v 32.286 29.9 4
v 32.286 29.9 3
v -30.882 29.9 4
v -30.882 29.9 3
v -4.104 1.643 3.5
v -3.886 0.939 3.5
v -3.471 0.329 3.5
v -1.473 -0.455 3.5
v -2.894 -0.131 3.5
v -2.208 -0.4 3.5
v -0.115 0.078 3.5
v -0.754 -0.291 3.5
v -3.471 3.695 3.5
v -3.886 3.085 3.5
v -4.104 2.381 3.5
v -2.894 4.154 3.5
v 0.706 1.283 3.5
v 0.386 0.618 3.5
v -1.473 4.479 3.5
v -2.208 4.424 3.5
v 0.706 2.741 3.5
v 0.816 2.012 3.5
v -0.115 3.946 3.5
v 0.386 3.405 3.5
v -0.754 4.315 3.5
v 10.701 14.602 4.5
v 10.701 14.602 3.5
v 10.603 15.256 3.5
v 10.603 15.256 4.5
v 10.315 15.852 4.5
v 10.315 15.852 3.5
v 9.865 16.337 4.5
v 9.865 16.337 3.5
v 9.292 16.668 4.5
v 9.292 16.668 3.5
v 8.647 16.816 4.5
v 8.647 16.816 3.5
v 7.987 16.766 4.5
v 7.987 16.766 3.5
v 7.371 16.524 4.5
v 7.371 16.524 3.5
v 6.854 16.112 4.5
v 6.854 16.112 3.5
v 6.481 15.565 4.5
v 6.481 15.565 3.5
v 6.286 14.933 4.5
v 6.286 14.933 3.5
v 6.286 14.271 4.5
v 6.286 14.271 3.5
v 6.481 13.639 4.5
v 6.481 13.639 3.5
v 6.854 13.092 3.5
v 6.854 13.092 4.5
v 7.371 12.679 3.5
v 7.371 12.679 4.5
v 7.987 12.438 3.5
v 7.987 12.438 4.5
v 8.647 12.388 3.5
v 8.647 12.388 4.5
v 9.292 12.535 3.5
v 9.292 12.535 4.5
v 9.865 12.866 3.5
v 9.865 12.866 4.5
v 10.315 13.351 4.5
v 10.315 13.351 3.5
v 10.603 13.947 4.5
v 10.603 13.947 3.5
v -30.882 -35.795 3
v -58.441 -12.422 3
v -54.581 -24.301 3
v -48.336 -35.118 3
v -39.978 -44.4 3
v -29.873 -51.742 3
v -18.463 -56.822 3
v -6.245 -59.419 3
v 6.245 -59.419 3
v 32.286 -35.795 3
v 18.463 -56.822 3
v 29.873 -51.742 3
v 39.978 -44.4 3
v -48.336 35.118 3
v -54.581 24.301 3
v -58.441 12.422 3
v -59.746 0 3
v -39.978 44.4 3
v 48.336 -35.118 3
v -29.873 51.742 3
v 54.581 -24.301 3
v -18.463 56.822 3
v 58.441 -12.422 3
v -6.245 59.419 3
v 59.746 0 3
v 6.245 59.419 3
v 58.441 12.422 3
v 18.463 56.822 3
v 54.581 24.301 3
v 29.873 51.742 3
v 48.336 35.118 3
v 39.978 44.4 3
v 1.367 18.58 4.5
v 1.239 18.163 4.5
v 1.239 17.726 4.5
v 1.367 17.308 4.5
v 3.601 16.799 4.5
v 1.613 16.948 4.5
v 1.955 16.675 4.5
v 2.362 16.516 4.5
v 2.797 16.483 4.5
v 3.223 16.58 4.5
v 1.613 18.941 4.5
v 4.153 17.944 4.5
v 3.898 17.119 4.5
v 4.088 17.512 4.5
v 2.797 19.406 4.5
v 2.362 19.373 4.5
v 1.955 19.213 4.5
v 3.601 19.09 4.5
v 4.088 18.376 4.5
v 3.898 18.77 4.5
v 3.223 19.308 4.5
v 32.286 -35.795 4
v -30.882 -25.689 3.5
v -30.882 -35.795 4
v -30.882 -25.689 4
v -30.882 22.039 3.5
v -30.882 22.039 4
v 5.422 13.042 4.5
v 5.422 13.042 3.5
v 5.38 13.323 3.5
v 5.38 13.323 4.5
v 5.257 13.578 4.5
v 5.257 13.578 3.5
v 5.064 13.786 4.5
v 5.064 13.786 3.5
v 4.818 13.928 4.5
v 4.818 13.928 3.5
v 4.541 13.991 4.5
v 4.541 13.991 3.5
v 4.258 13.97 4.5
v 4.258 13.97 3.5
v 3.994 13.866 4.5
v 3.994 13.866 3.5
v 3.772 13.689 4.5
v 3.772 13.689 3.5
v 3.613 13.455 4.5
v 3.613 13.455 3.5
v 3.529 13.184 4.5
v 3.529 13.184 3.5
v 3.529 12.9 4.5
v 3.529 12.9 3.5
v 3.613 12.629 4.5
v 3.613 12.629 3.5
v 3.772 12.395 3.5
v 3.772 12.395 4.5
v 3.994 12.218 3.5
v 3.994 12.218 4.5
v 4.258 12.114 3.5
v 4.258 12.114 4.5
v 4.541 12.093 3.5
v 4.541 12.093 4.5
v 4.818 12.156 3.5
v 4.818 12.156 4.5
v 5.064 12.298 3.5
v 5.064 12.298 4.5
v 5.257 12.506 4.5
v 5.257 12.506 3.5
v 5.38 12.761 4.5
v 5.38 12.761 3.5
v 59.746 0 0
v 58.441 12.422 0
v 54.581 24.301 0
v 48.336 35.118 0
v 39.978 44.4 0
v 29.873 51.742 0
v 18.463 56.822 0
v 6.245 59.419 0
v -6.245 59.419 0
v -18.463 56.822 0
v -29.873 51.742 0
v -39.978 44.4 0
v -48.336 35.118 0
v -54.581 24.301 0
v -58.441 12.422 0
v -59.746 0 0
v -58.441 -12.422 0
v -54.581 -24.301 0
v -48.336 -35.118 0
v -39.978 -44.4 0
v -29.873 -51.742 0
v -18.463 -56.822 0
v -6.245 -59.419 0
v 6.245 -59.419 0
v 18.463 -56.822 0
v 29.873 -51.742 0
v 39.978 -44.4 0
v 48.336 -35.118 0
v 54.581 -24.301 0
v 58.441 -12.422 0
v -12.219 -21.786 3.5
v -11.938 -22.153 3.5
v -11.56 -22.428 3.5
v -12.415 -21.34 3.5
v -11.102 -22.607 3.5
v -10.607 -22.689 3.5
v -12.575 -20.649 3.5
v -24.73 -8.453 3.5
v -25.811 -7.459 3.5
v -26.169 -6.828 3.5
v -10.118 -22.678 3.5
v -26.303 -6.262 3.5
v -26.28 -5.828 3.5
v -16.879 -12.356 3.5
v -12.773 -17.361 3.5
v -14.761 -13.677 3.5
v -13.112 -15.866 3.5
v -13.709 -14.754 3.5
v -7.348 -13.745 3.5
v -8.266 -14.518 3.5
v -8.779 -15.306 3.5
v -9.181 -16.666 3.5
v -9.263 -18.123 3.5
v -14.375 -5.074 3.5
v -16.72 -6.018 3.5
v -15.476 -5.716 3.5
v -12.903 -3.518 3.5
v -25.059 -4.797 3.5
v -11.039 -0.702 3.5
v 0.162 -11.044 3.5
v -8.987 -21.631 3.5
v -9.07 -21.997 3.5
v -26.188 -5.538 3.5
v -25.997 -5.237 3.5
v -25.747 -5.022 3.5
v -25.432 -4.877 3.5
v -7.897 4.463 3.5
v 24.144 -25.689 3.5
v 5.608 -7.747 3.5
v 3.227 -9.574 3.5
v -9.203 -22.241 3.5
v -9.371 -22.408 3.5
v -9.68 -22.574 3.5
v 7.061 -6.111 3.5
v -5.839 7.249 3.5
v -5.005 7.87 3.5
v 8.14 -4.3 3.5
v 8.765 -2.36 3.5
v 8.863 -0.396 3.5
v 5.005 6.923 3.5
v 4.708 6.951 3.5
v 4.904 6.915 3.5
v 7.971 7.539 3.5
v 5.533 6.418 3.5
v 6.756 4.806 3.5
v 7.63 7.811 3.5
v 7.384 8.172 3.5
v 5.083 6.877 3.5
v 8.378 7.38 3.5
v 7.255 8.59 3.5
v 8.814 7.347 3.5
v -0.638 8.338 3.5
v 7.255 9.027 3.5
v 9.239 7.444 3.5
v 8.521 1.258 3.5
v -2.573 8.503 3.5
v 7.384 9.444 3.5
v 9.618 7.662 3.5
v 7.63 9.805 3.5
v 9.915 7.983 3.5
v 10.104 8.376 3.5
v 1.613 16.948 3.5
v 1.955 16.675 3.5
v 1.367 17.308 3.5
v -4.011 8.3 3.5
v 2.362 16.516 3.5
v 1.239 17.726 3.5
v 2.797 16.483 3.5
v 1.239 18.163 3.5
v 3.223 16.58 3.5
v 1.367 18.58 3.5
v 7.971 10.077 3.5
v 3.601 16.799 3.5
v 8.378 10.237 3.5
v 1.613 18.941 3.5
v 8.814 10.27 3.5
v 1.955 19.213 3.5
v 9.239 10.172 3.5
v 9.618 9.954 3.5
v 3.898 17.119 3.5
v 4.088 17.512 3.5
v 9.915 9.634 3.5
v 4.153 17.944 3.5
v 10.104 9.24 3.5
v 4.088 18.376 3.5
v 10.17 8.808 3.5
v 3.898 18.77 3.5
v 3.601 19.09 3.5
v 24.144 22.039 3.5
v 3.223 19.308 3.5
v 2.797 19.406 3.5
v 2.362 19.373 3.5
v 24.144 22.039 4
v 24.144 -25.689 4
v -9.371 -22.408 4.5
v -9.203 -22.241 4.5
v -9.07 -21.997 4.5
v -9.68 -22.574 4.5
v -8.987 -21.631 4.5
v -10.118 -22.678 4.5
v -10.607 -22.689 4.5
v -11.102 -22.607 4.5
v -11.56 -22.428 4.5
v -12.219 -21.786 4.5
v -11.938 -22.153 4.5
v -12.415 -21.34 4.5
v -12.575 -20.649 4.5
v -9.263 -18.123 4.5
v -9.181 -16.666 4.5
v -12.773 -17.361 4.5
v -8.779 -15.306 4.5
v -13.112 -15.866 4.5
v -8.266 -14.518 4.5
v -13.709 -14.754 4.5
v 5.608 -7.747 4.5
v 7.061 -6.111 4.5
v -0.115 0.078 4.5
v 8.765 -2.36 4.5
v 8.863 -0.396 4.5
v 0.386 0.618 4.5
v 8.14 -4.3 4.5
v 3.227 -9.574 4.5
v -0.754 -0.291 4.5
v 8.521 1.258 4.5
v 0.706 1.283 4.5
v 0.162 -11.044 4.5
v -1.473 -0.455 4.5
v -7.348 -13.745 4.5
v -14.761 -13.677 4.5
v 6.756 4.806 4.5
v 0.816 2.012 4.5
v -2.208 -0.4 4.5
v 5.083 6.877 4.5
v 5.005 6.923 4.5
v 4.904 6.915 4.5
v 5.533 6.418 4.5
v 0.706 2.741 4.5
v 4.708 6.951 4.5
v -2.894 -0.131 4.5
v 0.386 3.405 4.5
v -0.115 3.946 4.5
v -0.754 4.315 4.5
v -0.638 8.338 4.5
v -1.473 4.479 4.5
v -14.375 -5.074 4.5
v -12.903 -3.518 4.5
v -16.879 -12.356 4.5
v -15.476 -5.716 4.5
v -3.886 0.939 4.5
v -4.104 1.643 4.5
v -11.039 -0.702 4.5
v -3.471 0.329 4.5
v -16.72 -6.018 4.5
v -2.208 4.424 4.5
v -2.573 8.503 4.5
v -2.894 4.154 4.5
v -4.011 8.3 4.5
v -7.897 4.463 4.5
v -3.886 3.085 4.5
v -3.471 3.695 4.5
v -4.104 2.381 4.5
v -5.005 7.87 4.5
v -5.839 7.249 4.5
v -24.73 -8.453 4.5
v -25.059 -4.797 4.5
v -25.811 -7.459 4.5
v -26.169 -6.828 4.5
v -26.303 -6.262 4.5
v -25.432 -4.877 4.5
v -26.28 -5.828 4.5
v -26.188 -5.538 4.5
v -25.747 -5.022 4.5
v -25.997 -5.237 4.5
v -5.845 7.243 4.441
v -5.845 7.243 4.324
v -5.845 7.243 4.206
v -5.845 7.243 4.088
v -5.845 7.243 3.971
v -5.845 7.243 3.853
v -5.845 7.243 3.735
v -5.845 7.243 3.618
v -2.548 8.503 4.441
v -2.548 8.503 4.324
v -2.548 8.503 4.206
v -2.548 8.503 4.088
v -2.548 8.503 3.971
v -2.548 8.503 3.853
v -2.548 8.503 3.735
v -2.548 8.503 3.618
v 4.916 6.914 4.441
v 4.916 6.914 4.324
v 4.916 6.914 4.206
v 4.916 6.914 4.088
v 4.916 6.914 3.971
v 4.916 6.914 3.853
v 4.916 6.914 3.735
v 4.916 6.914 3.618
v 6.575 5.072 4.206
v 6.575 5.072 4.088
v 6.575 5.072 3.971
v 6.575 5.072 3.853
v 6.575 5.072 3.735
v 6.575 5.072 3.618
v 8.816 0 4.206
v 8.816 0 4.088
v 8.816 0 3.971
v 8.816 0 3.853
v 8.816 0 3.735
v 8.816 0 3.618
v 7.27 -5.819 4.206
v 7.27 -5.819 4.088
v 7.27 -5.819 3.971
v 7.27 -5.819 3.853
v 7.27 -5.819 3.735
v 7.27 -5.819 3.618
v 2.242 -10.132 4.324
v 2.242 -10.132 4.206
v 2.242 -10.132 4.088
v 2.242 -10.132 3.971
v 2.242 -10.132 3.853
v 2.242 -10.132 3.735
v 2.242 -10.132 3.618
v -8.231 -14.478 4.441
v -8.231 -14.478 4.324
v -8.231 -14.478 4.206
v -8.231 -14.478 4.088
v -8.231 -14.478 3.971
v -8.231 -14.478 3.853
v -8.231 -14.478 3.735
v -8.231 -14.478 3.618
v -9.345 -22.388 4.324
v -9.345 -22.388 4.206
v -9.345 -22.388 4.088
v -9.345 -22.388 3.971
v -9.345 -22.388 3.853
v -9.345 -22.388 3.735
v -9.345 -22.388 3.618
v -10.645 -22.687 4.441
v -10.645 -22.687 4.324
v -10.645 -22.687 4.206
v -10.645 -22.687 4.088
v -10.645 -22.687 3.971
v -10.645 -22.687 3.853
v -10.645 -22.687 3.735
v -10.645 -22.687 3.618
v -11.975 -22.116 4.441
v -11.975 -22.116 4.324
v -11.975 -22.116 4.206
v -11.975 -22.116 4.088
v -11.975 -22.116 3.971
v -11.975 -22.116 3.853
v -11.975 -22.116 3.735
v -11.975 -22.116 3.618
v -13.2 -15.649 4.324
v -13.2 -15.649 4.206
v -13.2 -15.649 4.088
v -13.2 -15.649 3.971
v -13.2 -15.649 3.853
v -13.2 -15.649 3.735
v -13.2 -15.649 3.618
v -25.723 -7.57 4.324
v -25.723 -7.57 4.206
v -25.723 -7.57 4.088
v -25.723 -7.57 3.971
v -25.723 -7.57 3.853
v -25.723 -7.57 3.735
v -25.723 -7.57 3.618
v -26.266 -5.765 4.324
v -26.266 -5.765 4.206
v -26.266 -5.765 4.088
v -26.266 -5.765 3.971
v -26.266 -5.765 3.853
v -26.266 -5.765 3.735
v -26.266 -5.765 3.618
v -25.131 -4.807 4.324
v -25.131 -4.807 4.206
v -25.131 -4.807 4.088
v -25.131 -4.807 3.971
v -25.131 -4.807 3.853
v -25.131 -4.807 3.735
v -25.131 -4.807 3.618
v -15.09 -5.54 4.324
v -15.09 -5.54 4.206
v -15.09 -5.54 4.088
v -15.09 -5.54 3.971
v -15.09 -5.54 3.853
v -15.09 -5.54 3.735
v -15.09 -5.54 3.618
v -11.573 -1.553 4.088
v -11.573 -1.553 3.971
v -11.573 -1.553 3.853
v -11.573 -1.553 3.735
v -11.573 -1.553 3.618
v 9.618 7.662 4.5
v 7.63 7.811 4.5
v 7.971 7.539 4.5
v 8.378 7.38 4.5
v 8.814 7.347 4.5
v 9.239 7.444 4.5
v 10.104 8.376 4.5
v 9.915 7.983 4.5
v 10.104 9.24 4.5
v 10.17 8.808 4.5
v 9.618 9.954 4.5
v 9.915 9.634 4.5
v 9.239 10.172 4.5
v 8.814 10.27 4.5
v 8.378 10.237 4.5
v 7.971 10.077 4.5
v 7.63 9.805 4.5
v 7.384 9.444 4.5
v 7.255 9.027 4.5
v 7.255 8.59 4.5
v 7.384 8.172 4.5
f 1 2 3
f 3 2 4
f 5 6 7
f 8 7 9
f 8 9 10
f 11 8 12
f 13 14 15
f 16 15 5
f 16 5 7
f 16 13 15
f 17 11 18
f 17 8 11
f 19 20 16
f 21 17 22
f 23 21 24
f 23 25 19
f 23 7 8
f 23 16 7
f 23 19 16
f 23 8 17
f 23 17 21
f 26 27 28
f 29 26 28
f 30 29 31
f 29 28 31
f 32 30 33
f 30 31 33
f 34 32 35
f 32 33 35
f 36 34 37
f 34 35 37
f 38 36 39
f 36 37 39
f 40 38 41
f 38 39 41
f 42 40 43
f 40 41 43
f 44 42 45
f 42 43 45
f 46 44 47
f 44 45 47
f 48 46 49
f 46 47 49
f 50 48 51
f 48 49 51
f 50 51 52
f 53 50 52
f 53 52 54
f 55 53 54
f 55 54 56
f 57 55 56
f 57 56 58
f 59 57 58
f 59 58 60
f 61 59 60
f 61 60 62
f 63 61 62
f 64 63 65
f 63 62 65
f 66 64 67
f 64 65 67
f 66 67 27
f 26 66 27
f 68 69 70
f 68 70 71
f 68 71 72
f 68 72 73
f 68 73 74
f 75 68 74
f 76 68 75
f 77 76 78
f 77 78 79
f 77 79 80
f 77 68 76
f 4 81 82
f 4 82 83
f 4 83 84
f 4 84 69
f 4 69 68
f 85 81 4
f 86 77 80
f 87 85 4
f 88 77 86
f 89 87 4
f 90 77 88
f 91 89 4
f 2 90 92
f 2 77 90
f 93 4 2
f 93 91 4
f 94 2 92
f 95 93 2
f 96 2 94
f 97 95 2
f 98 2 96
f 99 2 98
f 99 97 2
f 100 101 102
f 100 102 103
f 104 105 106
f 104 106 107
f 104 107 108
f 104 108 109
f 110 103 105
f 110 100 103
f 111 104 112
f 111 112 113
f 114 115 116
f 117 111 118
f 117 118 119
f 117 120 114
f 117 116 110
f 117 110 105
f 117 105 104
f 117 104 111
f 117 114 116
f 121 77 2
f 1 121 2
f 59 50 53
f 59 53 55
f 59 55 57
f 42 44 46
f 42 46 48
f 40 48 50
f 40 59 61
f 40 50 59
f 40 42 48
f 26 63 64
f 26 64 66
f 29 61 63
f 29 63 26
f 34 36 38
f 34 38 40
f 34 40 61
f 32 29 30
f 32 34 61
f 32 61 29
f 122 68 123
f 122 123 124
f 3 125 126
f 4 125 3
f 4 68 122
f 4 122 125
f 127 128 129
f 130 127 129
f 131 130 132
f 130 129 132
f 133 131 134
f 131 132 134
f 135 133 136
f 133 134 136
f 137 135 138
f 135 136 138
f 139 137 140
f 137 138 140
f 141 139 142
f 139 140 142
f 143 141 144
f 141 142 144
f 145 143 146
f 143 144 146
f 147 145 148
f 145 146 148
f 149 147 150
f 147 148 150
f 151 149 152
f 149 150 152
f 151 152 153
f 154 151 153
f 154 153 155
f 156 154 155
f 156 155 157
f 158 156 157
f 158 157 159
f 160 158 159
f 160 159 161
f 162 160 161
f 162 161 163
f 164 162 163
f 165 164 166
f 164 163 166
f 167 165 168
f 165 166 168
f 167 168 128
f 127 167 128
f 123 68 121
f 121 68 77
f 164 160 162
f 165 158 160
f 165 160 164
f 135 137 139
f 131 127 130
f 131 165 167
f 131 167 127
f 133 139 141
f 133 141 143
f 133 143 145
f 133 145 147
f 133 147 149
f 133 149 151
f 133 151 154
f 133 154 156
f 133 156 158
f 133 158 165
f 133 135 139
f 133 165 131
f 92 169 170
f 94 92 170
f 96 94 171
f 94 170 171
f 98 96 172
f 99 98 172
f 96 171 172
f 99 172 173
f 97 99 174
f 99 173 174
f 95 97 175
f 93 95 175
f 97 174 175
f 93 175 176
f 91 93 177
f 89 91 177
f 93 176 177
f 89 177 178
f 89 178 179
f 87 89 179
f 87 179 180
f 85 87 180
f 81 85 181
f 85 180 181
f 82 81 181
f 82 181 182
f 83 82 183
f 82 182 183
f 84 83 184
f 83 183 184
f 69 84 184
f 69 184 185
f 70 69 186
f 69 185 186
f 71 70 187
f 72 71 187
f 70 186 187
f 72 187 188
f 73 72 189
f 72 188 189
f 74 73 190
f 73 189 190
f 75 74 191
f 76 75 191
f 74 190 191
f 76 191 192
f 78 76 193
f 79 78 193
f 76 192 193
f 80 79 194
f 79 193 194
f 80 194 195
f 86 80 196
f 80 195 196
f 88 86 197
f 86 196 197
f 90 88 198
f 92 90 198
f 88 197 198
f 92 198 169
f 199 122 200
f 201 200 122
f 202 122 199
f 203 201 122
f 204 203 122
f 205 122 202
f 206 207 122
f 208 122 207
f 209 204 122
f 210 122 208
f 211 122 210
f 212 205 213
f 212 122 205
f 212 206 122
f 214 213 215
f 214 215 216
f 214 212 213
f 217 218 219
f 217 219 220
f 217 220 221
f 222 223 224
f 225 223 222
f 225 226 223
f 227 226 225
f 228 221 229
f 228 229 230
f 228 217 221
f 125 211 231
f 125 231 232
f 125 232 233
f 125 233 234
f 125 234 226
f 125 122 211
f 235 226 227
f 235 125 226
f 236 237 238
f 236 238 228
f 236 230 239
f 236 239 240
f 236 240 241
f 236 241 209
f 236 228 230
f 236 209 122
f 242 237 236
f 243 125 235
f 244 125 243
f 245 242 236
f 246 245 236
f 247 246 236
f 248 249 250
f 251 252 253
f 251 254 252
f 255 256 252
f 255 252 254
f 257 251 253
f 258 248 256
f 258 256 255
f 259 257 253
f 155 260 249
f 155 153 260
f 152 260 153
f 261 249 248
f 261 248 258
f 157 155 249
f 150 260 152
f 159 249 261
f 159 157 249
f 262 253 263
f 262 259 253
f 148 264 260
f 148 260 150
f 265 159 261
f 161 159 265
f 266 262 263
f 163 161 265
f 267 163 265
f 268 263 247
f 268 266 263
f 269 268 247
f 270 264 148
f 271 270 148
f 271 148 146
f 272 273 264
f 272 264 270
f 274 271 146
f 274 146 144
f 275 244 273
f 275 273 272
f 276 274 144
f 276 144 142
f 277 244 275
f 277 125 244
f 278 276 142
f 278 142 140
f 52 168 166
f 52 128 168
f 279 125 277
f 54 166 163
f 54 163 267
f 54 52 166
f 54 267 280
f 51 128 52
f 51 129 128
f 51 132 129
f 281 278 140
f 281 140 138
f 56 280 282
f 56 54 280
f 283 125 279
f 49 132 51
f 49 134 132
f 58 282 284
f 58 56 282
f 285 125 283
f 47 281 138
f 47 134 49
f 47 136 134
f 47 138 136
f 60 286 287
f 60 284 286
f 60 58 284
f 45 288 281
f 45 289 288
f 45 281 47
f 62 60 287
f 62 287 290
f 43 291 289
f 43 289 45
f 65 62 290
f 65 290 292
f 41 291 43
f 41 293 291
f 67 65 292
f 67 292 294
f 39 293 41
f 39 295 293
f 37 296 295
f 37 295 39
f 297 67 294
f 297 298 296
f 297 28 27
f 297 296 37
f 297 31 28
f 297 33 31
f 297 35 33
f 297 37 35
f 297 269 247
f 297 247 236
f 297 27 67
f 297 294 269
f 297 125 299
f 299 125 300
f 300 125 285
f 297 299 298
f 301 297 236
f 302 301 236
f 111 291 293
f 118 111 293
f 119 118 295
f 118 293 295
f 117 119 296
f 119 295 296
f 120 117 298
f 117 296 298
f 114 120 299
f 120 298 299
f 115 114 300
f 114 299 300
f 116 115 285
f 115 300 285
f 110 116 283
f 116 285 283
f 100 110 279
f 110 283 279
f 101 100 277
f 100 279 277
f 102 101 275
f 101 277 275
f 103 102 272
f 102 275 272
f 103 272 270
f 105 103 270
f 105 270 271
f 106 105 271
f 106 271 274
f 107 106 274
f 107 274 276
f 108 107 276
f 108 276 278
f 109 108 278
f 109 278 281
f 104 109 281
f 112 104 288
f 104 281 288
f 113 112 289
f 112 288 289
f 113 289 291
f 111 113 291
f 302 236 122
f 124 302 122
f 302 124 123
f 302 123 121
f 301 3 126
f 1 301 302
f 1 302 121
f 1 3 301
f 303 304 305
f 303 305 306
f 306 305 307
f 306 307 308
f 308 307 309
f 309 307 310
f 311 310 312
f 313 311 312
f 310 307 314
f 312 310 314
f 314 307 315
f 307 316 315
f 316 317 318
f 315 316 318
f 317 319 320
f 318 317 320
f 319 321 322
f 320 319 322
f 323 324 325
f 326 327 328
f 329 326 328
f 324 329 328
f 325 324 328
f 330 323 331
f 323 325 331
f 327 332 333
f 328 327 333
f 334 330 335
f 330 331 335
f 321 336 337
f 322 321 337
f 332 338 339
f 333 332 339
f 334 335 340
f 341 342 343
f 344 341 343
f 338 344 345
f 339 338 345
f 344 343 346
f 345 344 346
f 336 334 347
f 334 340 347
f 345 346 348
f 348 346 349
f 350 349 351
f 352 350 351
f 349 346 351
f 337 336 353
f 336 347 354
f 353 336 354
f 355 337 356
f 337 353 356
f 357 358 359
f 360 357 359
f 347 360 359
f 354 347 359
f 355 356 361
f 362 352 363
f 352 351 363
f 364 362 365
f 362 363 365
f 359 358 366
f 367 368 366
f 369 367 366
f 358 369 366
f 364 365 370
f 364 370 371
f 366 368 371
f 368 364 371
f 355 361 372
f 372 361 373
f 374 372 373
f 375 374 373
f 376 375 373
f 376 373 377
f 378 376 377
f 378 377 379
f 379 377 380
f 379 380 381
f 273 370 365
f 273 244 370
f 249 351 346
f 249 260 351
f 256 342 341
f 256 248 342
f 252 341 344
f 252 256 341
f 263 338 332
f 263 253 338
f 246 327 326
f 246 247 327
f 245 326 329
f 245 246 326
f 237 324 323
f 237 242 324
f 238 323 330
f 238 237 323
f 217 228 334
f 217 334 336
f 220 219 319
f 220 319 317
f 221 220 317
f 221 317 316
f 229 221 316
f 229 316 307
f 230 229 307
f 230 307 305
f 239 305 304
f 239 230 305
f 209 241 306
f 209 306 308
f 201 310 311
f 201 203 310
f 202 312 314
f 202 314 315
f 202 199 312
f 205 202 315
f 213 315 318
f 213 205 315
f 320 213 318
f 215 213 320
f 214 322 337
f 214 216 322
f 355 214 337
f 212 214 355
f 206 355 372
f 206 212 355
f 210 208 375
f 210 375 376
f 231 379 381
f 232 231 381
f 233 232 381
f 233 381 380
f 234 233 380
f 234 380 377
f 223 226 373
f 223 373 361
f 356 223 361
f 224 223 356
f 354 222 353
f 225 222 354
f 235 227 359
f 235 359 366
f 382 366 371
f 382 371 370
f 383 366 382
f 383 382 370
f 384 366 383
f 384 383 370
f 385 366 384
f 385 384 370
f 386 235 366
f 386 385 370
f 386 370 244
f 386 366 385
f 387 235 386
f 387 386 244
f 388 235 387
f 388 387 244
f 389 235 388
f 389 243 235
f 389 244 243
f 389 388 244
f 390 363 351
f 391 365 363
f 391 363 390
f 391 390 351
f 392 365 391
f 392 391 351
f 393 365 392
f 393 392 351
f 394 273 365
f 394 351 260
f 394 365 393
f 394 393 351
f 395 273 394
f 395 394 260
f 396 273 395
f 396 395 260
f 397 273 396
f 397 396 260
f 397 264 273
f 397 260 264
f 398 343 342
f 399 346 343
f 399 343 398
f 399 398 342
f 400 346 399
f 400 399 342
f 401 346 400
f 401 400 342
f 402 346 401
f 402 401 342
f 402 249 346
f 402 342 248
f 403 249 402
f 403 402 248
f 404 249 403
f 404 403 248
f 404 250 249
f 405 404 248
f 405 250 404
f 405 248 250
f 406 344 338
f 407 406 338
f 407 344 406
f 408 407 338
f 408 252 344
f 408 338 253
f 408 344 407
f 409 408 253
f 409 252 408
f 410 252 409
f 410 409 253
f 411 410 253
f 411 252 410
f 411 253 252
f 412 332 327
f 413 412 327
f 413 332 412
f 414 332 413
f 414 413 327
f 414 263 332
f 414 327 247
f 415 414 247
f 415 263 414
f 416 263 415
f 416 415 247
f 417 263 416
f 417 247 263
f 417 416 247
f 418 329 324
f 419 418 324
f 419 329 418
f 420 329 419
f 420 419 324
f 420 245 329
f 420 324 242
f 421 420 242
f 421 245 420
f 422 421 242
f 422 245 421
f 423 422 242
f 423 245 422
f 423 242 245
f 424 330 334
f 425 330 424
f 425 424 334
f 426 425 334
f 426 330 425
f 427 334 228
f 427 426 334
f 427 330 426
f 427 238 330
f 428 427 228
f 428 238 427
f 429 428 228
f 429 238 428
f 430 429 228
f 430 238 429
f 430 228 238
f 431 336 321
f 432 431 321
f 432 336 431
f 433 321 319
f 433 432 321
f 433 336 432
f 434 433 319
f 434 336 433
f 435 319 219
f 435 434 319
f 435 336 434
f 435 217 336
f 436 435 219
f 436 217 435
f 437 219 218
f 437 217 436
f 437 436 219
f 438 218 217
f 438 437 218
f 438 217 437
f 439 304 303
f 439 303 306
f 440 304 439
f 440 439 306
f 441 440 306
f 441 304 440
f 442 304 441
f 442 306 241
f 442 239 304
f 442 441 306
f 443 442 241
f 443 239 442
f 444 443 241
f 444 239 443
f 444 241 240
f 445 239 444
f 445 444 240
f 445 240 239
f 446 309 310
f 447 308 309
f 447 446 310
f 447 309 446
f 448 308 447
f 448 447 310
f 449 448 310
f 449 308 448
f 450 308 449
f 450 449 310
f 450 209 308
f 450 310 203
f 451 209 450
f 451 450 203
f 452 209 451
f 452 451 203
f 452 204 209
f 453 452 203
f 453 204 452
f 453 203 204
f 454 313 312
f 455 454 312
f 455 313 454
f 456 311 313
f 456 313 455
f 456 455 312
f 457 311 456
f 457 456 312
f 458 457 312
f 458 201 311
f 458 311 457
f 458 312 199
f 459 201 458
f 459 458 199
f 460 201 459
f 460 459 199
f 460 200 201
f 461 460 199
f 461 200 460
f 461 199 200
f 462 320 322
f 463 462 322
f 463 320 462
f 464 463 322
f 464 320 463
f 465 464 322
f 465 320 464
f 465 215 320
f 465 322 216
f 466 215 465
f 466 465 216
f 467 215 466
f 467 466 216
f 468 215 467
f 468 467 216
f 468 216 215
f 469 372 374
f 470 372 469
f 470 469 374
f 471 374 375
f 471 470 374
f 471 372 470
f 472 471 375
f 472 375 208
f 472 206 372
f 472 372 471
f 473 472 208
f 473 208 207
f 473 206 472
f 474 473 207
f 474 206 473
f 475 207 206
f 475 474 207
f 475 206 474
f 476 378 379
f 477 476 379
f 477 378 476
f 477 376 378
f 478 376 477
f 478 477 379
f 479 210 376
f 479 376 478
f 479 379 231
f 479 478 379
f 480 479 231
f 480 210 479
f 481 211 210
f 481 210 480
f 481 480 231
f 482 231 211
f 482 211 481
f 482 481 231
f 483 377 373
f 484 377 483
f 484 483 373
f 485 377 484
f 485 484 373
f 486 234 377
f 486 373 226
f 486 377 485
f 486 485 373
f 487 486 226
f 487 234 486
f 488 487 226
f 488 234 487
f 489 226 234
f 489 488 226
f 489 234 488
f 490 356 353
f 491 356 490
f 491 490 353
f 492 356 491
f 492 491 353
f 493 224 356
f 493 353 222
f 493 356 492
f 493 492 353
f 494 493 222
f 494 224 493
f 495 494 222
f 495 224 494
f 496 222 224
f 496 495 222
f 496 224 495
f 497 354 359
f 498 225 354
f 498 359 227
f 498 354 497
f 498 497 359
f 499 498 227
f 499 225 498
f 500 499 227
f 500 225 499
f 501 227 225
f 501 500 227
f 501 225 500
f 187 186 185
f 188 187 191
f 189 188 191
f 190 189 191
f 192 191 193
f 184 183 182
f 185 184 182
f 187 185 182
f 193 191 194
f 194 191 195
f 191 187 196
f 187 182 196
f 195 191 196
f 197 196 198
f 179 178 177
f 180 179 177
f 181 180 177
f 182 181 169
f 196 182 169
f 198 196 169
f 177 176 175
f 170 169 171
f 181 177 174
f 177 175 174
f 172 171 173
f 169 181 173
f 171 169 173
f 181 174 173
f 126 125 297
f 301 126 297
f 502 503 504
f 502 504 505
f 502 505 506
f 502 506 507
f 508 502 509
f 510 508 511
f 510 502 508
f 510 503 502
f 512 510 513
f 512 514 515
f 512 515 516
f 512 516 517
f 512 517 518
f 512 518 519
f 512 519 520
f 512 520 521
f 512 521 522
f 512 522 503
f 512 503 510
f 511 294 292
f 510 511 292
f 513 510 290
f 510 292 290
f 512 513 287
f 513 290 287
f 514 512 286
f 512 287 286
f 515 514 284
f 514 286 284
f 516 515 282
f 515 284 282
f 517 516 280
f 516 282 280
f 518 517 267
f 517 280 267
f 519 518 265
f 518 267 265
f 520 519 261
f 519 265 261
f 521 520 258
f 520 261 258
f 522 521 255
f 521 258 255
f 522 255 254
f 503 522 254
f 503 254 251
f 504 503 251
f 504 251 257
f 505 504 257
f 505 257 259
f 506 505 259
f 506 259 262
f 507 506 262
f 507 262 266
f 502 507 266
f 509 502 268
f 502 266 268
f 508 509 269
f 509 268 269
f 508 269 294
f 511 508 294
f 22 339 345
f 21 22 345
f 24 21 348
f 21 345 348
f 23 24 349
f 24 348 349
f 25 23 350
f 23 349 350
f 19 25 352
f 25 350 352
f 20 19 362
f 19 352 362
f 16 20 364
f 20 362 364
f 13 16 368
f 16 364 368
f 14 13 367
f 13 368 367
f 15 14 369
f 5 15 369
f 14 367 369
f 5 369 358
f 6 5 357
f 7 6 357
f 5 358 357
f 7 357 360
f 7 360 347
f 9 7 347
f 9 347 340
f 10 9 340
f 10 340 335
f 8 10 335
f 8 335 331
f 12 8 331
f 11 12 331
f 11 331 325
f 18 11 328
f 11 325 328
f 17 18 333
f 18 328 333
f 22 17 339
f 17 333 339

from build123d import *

# Parameters (mm, degrees)
F0_R      = 59.746411041
F1_DEPTH  = 3
F3_DEPTH  = 1
F4_W      = 55.0267398357
F4_H      = 47.7272737771
F5_DEPTH  = 0.5
F7_DEPTH  = 1
F8_R      = 2.4738185133
F9_DEPTH  = 1
F10_R     = 2.2199318272
F10_R_2   = 1.465437808
F10_R_3   = 0.9519318114
F10_R_4   = 1.4654400208
F11_DEPTH = 1


with BuildPart() as f1:
    # F0 (on Top) → F1 (new body)
    with BuildSketch(Plane.XY):
        Circle(F0_R)
    extrude(amount=F1_DEPTH)

    # F2 (on face) → F3 (join)
    with BuildSketch(Plane.XY.offset(3)):
        Polygon((32.2861000896, 29.8997331411), (-30.8823548257, 29.8997331411), (-30.8823548257, 22.0387708396), (24.14438501, 22.0387708396), (24.14438501, -25.6885029376), (-30.8823548257, -25.6885029376), (-30.8823548257, -35.7954576612), (32.2861000896, -35.7954576612), align=None)
    extrude(amount=F3_DEPTH)

    # F4 (on face) → F5 (join)
    with BuildSketch(Plane.XY.offset(3)):
        with Locations((-3.3689849079, -1.824866049)):
            Rectangle(F4_W, F4_H)
    extrude(amount=F5_DEPTH)

    # F6 (on face) → F7 (join)
    with BuildSketch(Plane.XY.offset(3.5)):
        with BuildLine():
            add(Edge.make_bspline(
                [(-7.8967735171, 4.4630197808), (-6.7472410939, 6.3631146928), (-4.2978470766, 10.3579710963), (4.9236583813, 6.7117134789), (5.0381701976, 7.1338413451), (11.9620101246, -0.915486679), (3.2320457014, -11.8590867107), (-9.7005034886, -12.6508830087), (-9.2341364863, -19.6502724984), (-8.6216118359, -22.8505288553), (-12.5728787551, -22.7759109925), (-12.7049356975, -18.6588510203), (-12.8181265408, -12.6591944575), (-26.8299925031, -9.070957377), (-26.2673376023, -3.8043012984), (-20.0692490511, -5.9986578173), (-14.7561582368, -6.4054263727), (-11.4189815971, -1.4119849747), (-9.117917068, 2.4445567946), (-7.8967735171, 4.4630197808)],
                knots=[0, 0, 0, 0, 0.0628292736, 0.1346835267, 0.143073424, 0.2136489841, 0.3010025203, 0.3856405201, 0.4441669851, 0.4844793874, 0.523851834, 0.5706012448, 0.6285825789, 0.7189345215, 0.7591710772, 0.8181193089, 0.8750291185, 0.9332567218, 1, 1, 1, 1], degree=3))
        make_face()
    extrude(amount=F7_DEPTH)

    # F8 (on face) → F9 (cut)
    with BuildSketch(Plane.XY.offset(4.5)):
        with Locations((-1.6575232148, 2.0118856337)):
            Circle(F8_R)
    extrude(amount=-F9_DEPTH, mode=Mode.SUBTRACT)

    # F10 (on face) → F11 (join)
    with BuildSketch(Plane.XY.offset(3.5)):
        with Locations((8.4812575951, 14.6018015221)):
            Circle(F10_R)
        with Locations((2.6876691263, 17.9442577064)):
            Circle(F10_R_2)
        with Locations((4.4703115709, 13.0419889465)):
            Circle(F10_R_3)
        with Locations((8.704087697, 8.8082114235)):
            Circle(F10_R_4)
    extrude(amount=F11_DEPTH)


solid = f1.part
